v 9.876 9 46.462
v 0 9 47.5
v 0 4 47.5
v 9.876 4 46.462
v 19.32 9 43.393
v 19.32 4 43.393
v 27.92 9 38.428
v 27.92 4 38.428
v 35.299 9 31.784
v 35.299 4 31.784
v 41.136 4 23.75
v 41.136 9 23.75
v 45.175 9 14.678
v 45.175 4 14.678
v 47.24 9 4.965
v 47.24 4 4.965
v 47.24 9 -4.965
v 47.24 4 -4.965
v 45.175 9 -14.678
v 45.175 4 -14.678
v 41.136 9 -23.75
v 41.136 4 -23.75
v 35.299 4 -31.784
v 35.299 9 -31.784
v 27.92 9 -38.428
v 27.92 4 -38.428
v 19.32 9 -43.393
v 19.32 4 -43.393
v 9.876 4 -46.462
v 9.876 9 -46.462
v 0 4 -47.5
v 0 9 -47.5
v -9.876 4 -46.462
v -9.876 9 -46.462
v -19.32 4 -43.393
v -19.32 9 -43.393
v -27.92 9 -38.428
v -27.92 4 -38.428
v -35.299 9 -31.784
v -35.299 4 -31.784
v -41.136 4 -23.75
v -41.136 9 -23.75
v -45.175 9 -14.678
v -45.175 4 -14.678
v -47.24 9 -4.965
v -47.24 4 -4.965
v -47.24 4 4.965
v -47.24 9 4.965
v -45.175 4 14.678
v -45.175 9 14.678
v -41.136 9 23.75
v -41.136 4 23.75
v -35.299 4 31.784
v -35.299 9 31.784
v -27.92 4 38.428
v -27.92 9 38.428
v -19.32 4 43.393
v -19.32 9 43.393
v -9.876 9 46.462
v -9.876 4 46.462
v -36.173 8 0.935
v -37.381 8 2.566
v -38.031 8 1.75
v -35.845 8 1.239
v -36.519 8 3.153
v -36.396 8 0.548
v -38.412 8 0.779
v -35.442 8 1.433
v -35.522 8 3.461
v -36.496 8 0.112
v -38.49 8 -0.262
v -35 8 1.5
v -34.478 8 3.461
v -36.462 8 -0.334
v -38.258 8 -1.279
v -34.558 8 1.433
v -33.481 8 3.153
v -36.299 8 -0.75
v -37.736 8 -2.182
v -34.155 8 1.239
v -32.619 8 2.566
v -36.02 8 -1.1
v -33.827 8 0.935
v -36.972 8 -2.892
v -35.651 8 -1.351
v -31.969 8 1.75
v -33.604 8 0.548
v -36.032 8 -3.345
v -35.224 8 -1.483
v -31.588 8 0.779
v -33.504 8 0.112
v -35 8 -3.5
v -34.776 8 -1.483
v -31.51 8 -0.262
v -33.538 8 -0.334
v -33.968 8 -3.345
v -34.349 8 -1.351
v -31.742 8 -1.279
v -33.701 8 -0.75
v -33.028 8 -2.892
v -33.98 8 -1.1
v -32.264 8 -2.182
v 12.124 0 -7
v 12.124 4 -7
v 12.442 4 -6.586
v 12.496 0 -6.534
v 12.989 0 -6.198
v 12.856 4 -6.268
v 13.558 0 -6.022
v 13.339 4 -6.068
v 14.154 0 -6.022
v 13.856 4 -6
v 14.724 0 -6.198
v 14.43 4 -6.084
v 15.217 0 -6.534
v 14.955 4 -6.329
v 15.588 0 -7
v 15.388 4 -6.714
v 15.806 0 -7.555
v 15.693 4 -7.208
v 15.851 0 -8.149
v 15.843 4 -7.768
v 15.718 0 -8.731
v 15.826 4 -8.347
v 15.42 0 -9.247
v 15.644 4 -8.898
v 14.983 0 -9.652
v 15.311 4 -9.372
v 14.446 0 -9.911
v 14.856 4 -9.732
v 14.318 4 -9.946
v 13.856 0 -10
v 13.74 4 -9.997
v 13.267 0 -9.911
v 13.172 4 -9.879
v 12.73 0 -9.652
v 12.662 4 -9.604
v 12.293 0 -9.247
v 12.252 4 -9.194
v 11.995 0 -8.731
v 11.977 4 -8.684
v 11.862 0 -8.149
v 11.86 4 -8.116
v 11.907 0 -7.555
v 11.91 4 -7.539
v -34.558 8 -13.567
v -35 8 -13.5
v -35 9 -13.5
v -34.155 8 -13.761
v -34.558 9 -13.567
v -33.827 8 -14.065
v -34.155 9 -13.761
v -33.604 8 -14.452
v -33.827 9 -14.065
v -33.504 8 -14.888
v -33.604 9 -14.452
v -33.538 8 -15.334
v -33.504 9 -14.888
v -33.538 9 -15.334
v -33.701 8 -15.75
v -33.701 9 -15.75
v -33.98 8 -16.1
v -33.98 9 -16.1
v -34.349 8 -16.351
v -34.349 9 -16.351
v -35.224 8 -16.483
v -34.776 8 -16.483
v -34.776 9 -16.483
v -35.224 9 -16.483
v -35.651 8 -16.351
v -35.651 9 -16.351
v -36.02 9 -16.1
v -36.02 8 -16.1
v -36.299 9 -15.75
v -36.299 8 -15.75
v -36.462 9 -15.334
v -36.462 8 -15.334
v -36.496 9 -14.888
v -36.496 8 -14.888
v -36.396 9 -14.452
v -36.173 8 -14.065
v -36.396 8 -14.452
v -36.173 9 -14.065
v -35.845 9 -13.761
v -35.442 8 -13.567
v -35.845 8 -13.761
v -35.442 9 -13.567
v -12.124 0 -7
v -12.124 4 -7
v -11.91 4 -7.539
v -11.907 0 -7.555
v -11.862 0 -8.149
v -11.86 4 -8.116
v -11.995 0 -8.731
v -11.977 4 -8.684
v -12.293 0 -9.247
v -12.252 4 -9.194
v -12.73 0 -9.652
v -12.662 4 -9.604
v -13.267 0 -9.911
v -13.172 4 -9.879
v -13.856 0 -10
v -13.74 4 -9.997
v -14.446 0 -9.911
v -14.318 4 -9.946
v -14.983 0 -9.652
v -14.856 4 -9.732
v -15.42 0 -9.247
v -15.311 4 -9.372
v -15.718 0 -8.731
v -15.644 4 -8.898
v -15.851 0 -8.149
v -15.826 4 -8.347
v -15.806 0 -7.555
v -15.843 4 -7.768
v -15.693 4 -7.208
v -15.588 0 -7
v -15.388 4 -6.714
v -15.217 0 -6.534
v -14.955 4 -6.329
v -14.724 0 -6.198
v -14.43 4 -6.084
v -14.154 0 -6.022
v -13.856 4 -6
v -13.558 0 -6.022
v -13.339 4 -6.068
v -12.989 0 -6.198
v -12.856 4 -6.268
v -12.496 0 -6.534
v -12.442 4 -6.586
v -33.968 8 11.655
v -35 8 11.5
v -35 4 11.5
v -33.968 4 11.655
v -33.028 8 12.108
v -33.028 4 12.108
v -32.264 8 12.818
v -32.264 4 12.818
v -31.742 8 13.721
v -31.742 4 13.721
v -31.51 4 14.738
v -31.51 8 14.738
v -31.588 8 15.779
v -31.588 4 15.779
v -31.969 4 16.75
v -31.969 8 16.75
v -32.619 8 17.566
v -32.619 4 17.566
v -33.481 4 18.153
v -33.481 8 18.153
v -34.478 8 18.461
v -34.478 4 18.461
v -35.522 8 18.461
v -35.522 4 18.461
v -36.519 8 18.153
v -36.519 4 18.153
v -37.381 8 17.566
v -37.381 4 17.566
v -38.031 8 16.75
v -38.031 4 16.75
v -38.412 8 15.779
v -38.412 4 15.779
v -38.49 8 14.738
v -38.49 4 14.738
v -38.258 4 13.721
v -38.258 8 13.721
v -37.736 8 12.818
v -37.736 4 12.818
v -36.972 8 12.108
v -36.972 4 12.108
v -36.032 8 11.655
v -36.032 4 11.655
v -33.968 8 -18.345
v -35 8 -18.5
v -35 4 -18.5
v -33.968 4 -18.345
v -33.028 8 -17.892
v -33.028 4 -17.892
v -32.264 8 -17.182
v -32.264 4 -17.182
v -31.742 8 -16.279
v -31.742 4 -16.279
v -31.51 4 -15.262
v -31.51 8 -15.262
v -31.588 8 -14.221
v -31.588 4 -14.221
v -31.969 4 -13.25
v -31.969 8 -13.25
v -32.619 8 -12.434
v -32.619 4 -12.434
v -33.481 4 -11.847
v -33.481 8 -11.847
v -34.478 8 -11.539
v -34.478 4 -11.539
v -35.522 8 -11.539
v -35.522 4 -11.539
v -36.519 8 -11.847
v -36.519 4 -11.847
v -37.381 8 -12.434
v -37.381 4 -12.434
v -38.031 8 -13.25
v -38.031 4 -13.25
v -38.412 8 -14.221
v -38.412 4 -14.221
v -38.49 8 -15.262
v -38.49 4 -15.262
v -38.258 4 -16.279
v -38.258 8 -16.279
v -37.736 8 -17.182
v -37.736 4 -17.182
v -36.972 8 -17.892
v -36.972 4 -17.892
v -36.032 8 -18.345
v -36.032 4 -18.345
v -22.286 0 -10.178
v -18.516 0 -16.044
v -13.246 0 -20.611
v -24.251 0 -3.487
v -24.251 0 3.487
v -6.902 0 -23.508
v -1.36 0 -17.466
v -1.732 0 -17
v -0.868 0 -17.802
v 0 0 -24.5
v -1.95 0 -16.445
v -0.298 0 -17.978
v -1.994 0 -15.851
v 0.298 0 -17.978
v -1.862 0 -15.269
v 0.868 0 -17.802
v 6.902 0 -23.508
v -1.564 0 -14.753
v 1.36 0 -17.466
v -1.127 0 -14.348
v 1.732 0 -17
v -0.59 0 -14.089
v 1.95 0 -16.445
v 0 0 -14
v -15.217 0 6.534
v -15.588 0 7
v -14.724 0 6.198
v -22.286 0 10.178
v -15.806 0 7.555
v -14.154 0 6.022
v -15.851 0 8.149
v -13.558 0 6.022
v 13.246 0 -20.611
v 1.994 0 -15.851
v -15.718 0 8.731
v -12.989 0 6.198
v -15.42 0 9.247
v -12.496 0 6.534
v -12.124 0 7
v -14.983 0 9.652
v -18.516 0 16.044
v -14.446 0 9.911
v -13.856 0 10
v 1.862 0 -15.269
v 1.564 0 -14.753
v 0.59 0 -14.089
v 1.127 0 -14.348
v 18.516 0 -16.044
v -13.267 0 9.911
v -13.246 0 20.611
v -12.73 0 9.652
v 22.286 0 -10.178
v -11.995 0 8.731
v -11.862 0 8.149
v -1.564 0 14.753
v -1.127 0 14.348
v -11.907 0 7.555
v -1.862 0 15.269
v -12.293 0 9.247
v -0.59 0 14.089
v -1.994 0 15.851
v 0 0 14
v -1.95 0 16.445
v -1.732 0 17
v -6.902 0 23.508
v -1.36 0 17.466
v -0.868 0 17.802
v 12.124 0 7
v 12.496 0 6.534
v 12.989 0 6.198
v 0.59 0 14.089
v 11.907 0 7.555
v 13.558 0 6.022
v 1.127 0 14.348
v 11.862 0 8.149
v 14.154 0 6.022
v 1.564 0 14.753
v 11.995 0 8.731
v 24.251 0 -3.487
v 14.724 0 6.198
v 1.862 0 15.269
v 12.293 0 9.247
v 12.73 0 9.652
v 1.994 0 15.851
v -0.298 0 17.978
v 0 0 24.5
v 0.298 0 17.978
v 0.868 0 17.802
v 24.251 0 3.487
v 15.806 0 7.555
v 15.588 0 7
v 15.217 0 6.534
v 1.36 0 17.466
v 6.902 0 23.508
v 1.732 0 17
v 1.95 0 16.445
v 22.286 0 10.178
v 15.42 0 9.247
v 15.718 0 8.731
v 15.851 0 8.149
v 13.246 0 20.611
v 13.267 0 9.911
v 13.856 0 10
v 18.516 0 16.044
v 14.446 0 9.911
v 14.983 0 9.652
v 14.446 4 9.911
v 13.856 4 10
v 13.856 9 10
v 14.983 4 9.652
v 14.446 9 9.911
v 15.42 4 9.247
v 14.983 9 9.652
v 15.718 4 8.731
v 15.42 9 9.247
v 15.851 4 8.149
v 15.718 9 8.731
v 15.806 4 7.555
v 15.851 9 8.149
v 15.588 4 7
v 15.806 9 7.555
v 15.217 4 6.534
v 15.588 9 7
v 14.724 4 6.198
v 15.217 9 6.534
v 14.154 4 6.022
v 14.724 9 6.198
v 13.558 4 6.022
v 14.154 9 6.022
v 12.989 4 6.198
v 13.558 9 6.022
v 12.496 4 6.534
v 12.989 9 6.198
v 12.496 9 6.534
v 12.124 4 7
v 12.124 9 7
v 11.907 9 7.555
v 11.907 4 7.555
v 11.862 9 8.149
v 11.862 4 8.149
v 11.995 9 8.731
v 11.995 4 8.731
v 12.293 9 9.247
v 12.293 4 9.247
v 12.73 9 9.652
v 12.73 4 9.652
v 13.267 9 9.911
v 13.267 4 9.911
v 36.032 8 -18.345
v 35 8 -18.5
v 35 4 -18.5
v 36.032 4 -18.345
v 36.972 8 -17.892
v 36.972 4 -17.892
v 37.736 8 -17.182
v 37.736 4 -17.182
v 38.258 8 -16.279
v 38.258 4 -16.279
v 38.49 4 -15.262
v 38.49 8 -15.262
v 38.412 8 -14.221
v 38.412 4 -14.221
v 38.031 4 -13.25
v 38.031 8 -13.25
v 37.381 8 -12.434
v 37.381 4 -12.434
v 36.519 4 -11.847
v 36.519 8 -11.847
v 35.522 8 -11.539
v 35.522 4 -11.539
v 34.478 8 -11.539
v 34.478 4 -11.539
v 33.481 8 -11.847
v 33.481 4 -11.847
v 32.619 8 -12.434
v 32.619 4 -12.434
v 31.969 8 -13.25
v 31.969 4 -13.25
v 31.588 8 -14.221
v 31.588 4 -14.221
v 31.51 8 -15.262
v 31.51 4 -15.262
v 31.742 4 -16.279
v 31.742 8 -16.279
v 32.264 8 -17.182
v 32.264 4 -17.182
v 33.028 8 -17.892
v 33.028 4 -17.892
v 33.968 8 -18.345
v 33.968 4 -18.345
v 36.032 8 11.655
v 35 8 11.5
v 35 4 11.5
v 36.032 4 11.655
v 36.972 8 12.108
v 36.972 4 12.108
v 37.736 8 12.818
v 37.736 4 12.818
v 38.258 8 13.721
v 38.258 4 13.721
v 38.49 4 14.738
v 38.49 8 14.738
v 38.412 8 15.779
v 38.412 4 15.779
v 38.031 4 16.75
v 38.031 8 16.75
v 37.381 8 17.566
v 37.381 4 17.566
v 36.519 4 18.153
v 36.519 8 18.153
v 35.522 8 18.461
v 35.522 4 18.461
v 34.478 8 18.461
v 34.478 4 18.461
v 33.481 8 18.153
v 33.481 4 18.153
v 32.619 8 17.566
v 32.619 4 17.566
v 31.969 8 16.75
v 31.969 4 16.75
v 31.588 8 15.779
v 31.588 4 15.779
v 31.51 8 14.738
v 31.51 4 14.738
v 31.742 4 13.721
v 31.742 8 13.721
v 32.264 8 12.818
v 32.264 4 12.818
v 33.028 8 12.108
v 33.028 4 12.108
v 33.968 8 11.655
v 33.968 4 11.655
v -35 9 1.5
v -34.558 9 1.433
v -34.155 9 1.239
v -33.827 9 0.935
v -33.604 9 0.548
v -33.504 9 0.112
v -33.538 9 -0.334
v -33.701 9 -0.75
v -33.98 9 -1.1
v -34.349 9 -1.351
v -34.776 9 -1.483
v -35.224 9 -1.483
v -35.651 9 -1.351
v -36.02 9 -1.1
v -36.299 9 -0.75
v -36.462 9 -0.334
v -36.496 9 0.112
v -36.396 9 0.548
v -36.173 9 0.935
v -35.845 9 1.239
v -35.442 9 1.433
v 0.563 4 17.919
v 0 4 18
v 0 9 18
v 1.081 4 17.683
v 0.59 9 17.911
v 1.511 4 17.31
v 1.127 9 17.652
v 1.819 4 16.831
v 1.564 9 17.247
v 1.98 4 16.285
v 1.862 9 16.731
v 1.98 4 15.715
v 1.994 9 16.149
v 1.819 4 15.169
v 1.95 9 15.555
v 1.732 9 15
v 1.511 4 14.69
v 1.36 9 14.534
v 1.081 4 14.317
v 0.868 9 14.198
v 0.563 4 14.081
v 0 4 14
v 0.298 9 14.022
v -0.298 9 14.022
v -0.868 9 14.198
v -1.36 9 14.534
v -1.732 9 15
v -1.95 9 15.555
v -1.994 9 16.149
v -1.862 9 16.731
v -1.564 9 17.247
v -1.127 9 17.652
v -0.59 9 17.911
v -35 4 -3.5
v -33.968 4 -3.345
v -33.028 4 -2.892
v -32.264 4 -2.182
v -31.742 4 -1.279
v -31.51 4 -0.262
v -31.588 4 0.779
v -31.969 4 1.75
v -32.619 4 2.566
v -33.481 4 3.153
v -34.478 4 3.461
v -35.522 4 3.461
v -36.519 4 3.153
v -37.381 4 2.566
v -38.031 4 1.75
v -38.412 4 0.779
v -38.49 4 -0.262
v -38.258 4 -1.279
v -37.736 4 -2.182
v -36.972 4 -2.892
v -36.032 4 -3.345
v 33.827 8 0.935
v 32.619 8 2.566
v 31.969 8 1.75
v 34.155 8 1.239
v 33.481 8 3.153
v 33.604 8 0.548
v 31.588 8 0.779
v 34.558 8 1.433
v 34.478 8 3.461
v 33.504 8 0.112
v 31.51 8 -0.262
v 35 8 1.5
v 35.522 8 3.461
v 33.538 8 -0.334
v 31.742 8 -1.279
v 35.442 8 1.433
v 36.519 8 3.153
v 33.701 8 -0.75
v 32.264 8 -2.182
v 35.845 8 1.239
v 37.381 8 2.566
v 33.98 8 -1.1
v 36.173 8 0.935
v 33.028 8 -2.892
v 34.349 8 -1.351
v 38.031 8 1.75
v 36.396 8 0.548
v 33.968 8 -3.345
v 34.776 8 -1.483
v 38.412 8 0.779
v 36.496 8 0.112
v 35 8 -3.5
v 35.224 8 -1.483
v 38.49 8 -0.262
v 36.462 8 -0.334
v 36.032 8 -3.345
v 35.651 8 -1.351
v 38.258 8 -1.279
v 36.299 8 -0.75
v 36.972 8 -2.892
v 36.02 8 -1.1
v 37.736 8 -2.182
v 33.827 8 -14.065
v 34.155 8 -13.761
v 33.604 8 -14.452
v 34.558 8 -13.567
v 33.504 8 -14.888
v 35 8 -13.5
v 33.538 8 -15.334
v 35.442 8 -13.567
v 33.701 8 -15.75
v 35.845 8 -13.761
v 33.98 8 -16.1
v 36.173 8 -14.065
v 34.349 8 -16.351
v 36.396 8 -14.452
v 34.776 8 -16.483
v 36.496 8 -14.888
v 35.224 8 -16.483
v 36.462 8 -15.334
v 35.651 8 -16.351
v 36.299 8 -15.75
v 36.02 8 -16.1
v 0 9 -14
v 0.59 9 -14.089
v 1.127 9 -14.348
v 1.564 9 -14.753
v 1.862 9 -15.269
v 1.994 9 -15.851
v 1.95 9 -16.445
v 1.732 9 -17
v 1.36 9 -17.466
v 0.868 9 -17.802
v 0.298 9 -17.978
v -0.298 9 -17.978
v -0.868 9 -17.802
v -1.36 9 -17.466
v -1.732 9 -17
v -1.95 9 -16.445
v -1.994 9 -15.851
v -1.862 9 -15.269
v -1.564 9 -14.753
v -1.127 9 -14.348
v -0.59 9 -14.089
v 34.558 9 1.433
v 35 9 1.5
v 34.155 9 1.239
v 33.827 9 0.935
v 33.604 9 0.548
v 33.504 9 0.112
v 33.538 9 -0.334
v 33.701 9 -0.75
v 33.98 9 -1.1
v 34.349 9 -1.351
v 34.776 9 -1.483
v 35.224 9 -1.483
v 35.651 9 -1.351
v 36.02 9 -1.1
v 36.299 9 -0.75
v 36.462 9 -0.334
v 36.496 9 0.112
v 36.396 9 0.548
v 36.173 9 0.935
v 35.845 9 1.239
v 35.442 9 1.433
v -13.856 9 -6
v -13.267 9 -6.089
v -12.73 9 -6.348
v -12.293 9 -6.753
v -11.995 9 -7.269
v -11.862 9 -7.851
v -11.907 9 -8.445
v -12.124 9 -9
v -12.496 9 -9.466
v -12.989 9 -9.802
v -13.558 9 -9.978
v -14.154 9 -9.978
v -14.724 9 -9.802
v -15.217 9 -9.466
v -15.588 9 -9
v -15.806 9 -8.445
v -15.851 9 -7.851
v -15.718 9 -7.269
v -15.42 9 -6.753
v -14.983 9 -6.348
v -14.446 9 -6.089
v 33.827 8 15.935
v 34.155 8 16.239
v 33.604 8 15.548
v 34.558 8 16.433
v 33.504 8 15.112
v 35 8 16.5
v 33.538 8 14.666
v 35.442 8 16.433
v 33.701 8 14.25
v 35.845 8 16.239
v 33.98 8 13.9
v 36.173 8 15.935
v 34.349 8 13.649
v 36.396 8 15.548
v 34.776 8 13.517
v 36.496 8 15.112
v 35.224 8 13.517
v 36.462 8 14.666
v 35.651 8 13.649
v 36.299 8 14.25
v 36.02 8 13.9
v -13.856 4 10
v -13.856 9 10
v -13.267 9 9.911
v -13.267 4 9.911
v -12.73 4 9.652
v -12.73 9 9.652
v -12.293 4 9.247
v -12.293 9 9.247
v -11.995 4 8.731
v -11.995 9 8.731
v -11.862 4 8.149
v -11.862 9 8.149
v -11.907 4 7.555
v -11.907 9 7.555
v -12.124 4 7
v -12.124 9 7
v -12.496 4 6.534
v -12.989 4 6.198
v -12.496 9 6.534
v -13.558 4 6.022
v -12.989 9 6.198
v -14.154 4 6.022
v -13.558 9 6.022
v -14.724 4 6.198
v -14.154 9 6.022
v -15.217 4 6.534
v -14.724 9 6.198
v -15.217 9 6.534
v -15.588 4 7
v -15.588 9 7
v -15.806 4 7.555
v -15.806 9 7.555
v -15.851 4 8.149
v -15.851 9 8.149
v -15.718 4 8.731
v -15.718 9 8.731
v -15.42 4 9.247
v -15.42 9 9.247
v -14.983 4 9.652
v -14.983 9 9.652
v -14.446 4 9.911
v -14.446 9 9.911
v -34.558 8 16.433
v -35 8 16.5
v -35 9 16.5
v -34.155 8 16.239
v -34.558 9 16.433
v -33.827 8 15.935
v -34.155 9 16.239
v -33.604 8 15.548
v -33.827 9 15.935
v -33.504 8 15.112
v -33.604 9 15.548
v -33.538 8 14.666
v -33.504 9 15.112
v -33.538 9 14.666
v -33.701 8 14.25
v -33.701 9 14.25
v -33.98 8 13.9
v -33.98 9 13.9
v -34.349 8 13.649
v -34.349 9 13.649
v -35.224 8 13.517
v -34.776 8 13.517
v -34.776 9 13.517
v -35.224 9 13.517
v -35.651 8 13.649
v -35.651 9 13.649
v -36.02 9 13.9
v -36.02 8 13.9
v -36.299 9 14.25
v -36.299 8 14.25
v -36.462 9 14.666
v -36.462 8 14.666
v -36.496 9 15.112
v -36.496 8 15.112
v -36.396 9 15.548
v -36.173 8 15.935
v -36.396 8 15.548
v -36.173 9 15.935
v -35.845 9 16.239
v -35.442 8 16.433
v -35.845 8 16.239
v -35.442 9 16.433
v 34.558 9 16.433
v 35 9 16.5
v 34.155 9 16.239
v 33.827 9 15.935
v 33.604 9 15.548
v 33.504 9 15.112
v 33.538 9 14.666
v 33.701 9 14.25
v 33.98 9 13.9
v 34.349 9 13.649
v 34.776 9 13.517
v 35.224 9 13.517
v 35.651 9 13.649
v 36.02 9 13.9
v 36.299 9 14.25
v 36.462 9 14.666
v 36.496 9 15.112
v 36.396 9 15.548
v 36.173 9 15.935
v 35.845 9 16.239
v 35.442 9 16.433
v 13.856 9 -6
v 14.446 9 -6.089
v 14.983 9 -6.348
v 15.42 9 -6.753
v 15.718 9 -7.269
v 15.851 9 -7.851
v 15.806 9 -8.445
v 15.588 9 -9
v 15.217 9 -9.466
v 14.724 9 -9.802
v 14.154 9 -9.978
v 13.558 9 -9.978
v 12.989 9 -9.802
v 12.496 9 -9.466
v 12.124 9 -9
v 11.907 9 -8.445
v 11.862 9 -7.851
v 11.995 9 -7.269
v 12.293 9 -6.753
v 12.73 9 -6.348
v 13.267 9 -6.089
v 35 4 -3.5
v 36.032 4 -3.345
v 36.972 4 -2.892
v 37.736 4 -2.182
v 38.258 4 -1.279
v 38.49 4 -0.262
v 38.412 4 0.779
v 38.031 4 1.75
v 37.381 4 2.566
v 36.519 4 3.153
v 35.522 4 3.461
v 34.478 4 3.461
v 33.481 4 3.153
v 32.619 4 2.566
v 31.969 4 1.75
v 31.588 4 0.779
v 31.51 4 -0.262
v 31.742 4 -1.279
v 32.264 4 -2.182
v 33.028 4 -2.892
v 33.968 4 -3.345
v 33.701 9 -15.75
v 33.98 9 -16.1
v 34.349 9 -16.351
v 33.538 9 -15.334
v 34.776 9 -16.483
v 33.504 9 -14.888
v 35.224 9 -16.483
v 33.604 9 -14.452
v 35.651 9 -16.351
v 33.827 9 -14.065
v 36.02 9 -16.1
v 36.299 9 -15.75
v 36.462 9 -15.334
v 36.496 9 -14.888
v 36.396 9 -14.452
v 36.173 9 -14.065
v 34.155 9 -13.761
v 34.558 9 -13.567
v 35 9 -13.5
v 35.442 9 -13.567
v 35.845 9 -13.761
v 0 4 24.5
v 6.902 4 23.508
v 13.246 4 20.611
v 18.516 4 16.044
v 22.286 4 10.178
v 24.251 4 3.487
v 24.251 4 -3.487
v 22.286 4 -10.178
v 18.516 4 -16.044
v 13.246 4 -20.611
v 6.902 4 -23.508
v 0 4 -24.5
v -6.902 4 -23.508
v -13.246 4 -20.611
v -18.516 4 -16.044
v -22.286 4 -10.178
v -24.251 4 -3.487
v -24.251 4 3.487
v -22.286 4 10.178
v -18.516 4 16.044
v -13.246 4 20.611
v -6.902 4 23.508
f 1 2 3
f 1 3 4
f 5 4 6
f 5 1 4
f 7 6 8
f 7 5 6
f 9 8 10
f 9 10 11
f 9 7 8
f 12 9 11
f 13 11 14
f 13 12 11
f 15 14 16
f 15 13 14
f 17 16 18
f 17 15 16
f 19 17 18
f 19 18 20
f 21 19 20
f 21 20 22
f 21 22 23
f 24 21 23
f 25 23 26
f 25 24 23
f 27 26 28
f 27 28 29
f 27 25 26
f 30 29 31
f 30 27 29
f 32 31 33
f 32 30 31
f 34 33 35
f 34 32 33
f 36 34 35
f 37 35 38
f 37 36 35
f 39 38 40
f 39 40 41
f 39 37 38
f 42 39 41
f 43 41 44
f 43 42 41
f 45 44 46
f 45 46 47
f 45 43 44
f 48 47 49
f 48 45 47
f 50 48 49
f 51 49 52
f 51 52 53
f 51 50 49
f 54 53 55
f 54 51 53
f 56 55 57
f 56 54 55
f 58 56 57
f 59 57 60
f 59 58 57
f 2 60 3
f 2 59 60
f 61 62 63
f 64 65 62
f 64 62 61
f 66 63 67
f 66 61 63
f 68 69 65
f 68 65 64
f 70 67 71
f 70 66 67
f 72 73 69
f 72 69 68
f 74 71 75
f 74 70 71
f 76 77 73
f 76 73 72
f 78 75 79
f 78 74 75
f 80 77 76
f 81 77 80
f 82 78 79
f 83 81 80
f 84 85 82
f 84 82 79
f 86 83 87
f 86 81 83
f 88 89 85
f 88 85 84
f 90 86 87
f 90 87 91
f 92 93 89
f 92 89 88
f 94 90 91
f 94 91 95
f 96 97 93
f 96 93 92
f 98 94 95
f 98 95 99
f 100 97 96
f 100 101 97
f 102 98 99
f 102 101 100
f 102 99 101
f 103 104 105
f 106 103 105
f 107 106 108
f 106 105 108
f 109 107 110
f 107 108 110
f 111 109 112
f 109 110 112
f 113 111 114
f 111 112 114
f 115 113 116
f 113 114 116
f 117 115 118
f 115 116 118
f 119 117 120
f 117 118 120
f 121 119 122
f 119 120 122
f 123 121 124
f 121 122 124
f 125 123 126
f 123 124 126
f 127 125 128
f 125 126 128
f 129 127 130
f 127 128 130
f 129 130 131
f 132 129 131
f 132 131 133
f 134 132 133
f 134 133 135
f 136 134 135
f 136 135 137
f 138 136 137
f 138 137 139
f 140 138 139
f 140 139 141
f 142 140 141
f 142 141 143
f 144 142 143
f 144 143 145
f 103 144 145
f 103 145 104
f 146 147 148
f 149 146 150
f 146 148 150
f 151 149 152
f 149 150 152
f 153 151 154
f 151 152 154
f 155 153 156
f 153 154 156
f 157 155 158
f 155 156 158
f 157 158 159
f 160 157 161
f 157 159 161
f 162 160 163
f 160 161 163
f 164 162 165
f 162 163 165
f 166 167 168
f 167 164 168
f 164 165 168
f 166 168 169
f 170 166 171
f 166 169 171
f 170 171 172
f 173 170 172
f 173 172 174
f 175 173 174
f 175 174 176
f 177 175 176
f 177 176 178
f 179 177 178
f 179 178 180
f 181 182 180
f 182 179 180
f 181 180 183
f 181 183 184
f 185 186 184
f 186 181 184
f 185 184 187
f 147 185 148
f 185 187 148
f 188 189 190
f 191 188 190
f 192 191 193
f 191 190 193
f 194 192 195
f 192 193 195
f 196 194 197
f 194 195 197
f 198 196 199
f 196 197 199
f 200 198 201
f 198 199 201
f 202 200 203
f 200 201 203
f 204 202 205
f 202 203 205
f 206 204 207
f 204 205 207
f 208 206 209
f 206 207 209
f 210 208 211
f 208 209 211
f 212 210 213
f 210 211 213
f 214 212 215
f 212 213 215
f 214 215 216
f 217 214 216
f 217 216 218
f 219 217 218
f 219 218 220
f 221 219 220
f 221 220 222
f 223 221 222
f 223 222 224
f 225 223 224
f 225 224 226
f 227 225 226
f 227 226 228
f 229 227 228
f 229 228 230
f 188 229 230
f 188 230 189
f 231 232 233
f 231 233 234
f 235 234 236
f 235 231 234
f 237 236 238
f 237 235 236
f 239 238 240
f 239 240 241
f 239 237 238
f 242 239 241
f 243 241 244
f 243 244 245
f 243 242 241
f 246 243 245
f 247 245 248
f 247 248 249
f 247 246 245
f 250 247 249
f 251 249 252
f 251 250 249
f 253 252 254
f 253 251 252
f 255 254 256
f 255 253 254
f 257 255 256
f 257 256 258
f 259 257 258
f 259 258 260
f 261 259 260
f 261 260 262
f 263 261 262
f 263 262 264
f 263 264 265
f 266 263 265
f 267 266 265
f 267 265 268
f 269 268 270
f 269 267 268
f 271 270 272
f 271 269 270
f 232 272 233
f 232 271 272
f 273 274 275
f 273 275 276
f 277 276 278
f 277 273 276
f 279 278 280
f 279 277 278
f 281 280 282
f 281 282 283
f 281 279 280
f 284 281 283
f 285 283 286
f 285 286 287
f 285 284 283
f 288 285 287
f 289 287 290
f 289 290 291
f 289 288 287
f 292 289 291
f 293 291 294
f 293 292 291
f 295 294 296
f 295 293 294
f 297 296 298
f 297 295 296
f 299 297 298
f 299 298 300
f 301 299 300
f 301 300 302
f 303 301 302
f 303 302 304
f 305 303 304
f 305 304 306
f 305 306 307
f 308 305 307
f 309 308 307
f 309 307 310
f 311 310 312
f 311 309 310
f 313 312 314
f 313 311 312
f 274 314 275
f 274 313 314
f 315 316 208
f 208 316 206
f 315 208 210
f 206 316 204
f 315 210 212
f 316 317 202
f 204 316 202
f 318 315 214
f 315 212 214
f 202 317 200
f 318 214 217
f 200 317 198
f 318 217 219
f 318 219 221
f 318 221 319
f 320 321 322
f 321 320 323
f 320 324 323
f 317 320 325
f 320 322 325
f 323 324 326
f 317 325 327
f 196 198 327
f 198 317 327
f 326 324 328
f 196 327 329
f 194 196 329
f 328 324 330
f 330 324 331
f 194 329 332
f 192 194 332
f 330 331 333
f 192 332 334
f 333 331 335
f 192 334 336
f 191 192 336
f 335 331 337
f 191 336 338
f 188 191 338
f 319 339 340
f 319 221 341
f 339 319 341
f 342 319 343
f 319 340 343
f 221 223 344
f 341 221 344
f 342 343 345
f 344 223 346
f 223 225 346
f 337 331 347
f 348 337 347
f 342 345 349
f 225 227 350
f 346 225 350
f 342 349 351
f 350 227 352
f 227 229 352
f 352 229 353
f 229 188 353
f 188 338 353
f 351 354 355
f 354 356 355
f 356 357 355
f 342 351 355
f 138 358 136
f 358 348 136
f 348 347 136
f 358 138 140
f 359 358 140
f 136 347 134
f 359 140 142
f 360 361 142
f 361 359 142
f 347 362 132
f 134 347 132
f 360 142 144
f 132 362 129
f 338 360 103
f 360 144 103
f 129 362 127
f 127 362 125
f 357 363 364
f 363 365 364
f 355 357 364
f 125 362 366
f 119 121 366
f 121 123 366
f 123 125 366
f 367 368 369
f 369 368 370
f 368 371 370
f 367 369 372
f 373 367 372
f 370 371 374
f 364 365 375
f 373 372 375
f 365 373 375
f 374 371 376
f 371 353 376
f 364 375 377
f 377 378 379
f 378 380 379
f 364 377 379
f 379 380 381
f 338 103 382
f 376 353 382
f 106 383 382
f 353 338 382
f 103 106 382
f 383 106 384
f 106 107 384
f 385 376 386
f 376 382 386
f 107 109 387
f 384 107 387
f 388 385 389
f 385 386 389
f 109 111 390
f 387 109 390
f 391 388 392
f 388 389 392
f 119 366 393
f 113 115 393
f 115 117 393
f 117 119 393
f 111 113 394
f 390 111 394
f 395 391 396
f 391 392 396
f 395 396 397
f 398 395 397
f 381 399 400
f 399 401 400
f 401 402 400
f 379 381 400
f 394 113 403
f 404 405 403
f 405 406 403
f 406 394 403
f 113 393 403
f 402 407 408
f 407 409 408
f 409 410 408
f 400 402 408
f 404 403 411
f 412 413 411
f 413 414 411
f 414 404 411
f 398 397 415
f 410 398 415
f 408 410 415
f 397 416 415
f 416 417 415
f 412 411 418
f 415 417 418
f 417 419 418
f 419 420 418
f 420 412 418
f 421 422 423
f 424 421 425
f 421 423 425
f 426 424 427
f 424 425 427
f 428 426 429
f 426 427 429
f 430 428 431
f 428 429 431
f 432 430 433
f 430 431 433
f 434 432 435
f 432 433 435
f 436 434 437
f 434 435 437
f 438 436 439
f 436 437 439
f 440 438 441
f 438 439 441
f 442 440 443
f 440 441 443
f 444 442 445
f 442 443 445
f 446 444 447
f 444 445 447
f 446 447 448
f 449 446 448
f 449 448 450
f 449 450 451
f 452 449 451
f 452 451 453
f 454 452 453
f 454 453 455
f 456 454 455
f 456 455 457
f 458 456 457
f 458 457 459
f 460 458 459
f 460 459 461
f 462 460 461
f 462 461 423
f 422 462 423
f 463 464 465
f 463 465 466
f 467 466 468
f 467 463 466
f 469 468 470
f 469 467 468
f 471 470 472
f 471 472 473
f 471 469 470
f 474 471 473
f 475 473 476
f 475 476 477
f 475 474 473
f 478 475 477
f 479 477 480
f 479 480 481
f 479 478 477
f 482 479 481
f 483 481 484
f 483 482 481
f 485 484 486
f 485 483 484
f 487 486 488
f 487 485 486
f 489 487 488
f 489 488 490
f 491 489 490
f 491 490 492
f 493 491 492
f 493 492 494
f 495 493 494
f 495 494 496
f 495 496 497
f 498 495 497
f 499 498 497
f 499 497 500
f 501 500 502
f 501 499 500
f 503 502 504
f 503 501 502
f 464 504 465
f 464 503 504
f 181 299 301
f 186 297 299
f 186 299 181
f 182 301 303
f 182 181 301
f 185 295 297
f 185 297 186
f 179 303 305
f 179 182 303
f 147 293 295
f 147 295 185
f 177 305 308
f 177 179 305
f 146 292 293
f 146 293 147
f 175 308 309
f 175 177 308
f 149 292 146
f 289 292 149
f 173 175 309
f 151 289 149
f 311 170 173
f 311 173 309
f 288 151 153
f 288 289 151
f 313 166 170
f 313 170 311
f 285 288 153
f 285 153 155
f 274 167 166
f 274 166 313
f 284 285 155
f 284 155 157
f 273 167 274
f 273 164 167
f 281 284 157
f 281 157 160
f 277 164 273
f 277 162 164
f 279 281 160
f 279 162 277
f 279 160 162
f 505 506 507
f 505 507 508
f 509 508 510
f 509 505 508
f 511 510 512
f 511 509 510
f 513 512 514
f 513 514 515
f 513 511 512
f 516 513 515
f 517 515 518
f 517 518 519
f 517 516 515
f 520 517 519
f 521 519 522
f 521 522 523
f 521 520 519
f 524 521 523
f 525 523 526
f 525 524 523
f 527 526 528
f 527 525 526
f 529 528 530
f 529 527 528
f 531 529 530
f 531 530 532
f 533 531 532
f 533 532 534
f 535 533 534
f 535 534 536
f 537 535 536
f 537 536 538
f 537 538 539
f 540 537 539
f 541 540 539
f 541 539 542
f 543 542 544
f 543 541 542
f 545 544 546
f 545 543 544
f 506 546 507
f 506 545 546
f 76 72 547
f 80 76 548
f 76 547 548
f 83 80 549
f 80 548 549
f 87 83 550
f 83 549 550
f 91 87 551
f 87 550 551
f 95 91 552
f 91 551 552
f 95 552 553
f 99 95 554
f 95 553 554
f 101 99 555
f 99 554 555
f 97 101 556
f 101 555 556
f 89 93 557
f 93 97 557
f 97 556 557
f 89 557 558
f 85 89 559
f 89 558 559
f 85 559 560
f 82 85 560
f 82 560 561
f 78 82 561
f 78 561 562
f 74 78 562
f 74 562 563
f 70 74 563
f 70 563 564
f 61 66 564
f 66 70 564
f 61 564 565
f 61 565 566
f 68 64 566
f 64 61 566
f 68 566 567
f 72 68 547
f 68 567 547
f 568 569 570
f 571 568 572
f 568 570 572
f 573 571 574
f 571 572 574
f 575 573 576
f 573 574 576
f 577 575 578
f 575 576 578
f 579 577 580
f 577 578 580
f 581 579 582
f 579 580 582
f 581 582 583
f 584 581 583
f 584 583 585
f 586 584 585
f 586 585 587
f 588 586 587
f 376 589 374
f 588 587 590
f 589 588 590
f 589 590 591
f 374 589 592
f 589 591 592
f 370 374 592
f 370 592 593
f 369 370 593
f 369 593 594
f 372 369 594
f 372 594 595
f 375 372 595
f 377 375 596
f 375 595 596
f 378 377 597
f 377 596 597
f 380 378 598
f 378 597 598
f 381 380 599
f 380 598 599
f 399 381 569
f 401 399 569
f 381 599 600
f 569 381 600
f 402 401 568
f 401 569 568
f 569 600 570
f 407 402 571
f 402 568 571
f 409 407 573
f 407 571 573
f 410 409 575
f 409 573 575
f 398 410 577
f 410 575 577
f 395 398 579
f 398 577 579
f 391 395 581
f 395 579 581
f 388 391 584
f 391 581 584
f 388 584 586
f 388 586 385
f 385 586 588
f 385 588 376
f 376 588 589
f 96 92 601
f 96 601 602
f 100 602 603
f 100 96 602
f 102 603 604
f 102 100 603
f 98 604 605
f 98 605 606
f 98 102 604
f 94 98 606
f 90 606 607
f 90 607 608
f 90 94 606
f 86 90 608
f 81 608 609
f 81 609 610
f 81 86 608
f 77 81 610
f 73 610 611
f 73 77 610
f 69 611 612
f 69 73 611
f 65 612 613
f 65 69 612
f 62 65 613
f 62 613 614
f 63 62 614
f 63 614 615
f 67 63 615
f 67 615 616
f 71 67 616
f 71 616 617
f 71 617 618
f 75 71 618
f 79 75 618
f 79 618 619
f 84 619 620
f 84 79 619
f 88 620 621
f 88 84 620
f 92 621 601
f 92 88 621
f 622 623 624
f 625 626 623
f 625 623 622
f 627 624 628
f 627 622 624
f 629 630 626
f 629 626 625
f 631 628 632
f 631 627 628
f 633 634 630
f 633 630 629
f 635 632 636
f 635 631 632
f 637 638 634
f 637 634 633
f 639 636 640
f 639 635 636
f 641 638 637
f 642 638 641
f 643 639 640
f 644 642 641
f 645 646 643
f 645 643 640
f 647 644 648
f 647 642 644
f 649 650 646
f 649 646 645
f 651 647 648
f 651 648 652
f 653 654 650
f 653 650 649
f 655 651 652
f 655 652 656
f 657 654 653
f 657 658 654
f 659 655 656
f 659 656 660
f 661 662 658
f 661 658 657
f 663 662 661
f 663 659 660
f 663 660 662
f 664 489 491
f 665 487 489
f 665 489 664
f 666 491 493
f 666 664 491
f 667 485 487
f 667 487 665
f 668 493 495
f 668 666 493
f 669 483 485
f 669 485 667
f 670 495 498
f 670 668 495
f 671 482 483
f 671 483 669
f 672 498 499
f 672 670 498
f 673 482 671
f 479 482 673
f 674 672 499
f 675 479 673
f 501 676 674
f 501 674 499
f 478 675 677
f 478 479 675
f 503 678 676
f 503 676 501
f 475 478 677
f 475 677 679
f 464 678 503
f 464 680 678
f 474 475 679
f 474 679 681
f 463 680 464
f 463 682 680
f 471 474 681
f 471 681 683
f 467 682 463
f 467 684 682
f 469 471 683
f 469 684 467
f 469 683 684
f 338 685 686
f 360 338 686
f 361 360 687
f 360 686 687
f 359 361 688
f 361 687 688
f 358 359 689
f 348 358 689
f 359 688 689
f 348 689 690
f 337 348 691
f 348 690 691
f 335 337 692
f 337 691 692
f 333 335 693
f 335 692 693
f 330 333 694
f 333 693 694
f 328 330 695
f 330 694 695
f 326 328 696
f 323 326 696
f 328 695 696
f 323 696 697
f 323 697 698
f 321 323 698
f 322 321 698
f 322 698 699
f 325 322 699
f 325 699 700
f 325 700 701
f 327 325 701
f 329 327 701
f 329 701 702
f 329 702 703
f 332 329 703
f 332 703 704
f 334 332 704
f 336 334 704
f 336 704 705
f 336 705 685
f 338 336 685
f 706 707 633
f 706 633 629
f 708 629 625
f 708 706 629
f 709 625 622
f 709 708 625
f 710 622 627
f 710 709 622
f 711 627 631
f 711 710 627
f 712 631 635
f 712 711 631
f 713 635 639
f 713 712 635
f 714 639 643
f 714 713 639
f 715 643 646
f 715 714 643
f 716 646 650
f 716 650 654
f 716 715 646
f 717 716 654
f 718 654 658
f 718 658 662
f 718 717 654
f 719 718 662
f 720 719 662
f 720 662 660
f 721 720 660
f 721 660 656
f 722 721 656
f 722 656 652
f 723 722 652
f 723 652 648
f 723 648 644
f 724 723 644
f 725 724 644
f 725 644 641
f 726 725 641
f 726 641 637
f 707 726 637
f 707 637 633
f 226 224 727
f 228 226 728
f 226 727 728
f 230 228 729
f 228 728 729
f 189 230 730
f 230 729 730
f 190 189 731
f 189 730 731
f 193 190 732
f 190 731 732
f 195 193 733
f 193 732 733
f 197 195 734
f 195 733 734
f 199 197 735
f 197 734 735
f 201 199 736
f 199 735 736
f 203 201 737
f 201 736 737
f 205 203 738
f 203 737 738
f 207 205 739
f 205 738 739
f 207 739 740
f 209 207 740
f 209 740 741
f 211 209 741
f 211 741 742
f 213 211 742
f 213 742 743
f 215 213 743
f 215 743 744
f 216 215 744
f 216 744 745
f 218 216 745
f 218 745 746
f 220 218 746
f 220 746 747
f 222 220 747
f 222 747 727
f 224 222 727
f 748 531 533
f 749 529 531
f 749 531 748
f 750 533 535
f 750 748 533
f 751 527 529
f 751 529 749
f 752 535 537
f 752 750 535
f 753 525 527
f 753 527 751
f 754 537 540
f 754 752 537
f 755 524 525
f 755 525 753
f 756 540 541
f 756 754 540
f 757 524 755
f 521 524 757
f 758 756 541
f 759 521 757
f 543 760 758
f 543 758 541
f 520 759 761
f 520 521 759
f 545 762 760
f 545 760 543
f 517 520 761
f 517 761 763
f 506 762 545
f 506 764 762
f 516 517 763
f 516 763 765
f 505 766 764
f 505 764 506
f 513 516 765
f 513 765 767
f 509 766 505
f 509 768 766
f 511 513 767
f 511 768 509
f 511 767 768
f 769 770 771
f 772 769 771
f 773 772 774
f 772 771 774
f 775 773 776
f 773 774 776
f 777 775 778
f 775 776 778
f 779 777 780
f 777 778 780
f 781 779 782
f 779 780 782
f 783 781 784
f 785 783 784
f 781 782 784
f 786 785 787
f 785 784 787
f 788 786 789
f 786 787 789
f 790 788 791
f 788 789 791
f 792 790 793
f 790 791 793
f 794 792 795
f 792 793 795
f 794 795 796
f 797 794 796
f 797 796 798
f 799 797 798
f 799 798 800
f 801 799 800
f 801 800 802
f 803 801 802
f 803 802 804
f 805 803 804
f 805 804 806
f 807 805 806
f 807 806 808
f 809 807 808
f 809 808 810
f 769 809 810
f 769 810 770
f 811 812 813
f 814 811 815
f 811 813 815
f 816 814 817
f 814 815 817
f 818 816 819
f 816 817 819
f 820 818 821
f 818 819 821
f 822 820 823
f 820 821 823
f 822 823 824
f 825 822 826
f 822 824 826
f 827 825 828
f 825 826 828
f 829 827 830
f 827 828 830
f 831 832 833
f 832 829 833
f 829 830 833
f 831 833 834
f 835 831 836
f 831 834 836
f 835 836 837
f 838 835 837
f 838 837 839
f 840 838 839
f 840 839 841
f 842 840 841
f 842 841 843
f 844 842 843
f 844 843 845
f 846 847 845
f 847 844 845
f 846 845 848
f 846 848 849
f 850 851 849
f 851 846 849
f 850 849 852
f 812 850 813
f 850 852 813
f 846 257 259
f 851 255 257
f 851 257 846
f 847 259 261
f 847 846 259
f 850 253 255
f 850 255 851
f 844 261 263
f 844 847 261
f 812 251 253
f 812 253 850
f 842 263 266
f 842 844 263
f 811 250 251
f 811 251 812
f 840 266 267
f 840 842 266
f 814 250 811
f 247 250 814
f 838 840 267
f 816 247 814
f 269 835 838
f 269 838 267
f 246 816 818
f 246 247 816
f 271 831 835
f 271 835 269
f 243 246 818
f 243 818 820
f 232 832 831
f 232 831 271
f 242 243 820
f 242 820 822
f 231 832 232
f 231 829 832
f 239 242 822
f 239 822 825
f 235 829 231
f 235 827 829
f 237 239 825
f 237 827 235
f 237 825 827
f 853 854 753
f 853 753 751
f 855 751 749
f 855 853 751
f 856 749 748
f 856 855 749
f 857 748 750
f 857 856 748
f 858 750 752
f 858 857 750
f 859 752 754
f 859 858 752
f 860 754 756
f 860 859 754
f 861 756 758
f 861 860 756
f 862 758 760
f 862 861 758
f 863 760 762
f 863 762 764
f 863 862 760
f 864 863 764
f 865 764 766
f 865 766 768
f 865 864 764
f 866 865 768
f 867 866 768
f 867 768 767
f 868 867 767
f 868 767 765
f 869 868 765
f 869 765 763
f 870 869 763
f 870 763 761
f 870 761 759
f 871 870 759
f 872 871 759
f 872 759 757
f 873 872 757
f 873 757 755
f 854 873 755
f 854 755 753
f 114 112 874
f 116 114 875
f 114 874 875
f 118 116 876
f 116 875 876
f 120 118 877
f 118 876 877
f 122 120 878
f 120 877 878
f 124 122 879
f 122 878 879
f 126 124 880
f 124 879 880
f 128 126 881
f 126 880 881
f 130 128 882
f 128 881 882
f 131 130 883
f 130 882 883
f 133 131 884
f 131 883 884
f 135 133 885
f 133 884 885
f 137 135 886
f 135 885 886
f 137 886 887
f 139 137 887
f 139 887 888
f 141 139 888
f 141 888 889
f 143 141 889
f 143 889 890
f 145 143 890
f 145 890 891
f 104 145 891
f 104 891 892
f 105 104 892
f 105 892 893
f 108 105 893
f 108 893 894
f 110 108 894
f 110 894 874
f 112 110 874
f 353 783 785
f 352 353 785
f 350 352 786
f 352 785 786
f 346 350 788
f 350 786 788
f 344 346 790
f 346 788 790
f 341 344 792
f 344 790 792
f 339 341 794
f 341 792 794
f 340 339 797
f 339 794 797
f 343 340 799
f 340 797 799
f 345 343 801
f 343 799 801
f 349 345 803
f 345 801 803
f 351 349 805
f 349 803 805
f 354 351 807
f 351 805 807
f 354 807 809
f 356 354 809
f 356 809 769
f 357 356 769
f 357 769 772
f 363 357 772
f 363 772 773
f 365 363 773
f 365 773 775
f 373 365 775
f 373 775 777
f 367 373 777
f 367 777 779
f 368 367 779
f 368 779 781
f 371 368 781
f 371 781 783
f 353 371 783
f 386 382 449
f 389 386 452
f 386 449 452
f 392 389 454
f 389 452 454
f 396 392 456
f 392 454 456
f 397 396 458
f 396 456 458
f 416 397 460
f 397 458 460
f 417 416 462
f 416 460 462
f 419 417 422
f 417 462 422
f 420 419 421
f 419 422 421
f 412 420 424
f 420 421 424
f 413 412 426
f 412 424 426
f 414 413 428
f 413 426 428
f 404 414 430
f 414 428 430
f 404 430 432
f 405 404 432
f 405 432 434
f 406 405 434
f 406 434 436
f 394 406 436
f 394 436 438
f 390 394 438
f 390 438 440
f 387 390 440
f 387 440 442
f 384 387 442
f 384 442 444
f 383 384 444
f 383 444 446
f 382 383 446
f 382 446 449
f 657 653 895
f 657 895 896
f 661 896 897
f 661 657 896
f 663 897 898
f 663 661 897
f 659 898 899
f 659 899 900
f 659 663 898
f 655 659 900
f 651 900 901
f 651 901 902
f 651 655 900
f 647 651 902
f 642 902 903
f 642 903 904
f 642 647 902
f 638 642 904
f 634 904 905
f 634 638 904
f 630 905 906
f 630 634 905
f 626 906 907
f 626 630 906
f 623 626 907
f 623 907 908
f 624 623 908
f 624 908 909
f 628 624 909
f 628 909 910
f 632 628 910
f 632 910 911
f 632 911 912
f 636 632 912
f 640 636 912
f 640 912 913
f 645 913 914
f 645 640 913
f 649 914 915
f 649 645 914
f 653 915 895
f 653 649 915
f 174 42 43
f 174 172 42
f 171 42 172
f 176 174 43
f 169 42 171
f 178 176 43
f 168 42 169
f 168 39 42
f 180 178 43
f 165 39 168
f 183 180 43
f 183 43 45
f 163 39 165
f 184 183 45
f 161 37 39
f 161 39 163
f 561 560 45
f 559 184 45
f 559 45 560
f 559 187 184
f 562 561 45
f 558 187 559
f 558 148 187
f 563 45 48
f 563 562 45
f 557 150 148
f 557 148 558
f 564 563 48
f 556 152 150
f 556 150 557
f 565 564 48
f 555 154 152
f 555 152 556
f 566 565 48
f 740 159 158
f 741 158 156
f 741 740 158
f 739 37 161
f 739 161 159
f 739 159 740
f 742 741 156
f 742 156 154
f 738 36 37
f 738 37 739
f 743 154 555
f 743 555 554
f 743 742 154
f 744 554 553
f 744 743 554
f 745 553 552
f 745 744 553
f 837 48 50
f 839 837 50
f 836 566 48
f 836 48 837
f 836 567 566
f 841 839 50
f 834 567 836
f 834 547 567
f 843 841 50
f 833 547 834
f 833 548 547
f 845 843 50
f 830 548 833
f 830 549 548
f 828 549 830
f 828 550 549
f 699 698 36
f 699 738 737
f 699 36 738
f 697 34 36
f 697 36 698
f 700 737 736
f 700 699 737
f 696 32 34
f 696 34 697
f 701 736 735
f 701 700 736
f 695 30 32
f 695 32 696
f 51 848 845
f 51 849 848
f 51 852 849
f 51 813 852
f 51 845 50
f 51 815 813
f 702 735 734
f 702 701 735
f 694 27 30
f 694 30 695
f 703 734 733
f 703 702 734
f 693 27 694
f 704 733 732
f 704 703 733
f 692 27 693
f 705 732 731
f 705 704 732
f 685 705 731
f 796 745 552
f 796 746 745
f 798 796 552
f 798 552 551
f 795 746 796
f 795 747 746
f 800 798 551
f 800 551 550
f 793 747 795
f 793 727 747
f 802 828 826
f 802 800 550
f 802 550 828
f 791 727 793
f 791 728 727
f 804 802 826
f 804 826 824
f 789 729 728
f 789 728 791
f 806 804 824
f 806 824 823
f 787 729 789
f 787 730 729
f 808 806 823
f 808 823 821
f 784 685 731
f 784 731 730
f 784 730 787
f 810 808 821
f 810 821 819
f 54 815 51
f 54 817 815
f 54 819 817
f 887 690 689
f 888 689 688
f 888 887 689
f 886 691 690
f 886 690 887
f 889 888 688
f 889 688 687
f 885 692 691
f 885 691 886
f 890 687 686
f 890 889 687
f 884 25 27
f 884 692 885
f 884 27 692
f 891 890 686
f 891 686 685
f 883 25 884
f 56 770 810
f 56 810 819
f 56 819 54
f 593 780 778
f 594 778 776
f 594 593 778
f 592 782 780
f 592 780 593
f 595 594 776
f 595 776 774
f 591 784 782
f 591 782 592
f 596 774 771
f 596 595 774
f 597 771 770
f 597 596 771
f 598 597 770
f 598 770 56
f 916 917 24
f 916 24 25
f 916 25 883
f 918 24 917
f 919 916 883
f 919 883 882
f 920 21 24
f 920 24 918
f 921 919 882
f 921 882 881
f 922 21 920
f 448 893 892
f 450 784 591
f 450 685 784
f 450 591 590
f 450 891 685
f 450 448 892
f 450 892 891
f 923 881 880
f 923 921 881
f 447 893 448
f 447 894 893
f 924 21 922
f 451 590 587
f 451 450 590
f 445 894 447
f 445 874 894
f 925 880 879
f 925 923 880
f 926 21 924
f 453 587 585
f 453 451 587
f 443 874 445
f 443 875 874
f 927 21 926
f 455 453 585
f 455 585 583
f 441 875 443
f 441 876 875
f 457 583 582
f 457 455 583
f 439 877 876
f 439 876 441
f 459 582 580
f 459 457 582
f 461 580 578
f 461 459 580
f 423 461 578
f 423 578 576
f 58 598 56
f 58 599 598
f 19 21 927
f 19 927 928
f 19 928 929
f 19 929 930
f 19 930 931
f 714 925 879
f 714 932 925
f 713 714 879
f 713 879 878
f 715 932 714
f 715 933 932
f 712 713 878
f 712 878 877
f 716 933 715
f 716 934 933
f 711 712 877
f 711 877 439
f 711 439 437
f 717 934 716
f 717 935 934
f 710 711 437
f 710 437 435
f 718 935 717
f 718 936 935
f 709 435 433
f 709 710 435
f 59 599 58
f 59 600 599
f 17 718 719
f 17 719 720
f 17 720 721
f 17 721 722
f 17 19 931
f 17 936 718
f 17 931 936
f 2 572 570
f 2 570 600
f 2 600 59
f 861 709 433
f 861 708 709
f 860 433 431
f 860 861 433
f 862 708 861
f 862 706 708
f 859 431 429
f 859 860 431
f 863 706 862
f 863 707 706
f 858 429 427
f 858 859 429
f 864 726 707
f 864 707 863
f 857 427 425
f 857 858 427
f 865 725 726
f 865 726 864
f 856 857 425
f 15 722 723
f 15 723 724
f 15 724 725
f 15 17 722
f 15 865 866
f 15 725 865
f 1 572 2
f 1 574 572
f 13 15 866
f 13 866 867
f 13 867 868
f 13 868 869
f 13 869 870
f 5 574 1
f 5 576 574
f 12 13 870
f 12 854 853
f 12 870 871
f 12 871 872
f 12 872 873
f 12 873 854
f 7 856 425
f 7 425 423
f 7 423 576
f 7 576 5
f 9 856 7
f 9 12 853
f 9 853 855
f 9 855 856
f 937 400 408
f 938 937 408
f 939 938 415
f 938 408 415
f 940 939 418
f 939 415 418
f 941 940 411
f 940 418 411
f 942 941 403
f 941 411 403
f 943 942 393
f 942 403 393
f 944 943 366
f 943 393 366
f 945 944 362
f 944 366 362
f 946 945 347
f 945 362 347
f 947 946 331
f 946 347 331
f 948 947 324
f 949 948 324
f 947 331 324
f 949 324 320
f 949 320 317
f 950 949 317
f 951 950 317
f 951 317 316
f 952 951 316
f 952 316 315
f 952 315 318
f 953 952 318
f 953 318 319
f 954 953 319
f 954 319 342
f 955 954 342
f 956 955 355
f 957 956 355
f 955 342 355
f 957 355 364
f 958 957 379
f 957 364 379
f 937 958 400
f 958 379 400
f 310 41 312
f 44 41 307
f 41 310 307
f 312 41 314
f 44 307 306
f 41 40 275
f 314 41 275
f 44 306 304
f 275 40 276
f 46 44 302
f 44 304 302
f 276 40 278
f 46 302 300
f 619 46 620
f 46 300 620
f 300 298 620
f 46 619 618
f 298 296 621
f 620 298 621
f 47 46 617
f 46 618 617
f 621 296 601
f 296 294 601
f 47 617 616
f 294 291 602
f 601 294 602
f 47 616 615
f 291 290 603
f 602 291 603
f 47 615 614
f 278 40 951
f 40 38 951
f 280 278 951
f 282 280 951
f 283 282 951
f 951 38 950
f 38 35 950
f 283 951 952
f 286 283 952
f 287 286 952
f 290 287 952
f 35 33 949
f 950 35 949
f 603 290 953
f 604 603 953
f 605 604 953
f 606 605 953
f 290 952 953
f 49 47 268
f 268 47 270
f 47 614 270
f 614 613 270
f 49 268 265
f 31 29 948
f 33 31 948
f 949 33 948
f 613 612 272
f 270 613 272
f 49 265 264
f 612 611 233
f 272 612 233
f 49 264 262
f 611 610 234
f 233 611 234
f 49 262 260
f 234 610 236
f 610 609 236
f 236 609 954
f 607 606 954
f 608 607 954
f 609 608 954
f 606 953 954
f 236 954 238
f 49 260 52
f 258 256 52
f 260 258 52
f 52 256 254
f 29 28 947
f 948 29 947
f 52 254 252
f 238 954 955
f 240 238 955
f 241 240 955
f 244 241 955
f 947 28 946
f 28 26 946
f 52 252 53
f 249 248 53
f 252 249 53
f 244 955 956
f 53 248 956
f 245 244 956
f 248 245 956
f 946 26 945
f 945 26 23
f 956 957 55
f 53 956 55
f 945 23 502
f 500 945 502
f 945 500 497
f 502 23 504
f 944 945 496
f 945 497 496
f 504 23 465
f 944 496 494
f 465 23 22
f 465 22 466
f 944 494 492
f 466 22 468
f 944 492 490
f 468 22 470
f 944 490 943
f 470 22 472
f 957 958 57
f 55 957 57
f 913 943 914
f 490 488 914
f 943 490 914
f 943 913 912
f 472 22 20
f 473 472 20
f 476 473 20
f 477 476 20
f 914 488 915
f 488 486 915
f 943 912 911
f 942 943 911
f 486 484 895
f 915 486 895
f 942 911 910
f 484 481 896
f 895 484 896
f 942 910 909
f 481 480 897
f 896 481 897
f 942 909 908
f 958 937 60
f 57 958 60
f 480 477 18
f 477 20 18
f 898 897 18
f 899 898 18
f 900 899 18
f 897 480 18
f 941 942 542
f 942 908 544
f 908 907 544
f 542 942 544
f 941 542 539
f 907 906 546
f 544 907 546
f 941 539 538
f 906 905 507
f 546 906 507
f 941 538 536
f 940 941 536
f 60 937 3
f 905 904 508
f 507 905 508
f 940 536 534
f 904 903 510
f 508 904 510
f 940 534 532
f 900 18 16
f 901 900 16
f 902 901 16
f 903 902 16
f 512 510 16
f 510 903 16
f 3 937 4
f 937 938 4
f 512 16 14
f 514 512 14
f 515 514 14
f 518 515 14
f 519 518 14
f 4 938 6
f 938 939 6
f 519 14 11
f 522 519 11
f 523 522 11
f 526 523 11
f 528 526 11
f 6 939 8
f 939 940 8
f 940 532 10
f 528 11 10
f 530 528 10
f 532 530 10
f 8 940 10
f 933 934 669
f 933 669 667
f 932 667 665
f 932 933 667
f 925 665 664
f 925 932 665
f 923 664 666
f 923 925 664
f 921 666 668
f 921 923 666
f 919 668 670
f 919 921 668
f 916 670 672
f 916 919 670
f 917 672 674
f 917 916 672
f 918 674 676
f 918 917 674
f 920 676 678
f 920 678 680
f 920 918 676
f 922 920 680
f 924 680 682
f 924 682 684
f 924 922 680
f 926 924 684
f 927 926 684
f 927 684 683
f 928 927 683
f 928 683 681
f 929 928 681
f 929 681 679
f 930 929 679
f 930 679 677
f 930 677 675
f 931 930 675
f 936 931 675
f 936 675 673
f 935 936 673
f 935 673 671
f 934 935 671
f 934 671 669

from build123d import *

# Parameters (mm, degrees)
CROQUIS1_R              = 24.5
SALIENTE_EXTRUIR1_DEPTH = 4
CROQUIS2_R              = 2
CORTAR_EXTRUIR1_DEPTH   = 35.878360053
MATRIZC1_COUNT          = 6
SALIENTE_EXTRUIR2_START = 5
CROQUIS3_R              = 47.5
CROQUIS3_R_2            = 2
SALIENTE_EXTRUIR2_DEPTH = 5
CROQUIS6_R              = 1.5
CORTAR_EXTRUIR2_DEPTH   = 68.775364256
CORTAR_EXTRUIR3_START   = -4
CROQUIS7_R              = 3.5
CROQUIS7_R_2            = 1.5
CORTAR_EXTRUIR3_DEPTH   = 4


with BuildPart() as part:
    # Croquis1 → Saliente-Extruir1 (new body)
    with BuildSketch(Plane(origin=(0, 0, 0), x_dir=(1, 0, 0), z_dir=(0, 1, 0))):
        with Locations(Location((0, 0, 0), (0, 0, 270))):
            Circle(CROQUIS1_R)
    extrude(amount=SALIENTE_EXTRUIR1_DEPTH)

    # Croquis2 → Cortar-Extruir1 (cut, through all)
    with BuildSketch(Plane(origin=(0, 4, 0), x_dir=(1, 0, 0), z_dir=(0, 1, 0))):
        with Locations(Location((0, 16, 0), (0, 0, 270))):
            Circle(CROQUIS2_R)
    cortar_extruir1 = extrude(amount=-CORTAR_EXTRUIR1_DEPTH, mode=Mode.SUBTRACT)

    # MatrizC1: Cortar-Extruir1 ×6 about axis
    matrizc1_axis = Axis((0, 0, 0), (0, 1, 0))
    for i in range(1, MATRIZC1_COUNT):
        add(cortar_extruir1.rotate(matrizc1_axis, i * 360 / MATRIZC1_COUNT), mode=Mode.SUBTRACT)

    # Croquis3 → Saliente-Extruir2 (add)
    with BuildSketch(Plane(origin=(0, 4, 0), x_dir=(1, 0, 0), z_dir=(0, 1, 0)).offset(SALIENTE_EXTRUIR2_START)):
        with Locations(Location((0, 0, 0), (0, 0, 270))):
            Circle(CROQUIS3_R)
        with Locations(Location((13.856406461, 8, 0), (0, 0, 270))):
            Circle(CROQUIS3_R_2, mode=Mode.SUBTRACT)
        with Locations(Location((13.856406461, -8, 0), (0, 0, 270))):
            Circle(CROQUIS3_R_2, mode=Mode.SUBTRACT)
        with Locations(Location((0, -16, 0), (0, 0, 270))):
            Circle(CROQUIS3_R_2, mode=Mode.SUBTRACT)
        with Locations(Location((-13.856406461, -8, 0), (0, 0, 270))):
            Circle(CROQUIS3_R_2, mode=Mode.SUBTRACT)
        with Locations(Location((-13.856406461, 8, 0), (0, 0, 270))):
            Circle(CROQUIS3_R_2, mode=Mode.SUBTRACT)
        with Locations(Location((0, 16, 0), (0, 0, 270))):
            Circle(CROQUIS3_R_2, mode=Mode.SUBTRACT)
    extrude(amount=-SALIENTE_EXTRUIR2_DEPTH)

    # Croquis6 → Cortar-Extruir2 (cut, through all)
    with BuildSketch(Plane(origin=(0, 9, 0), x_dir=(1, 0, 0), z_dir=(0, 1, 0))):
        with Locations(Location((-35, 15, 0), (0, 0, 270))):
            Circle(CROQUIS6_R)
        with Locations(Location((-35, 0, 0), (0, 0, 270))):
            Circle(CROQUIS6_R)
        with Locations(Location((-35, -15, 0), (0, 0, 270))):
            Circle(CROQUIS6_R)
    cortar_extruir2 = extrude(amount=-CORTAR_EXTRUIR2_DEPTH, mode=Mode.SUBTRACT)

    # Simetría1: Cortar-Extruir2 across plane
    add(cortar_extruir2.mirror(Plane(origin=(0, 0, 0), x_dir=(0, 0, 1), z_dir=(1, 0, 0))), mode=Mode.SUBTRACT)

    # Croquis7 → Cortar-Extruir3 (cut)
    # profile 1 of 6: a face of its own
    with BuildSketch(Plane.XZ.offset(-4).offset(CORTAR_EXTRUIR3_START)):
        with Locations(Location((35, 15, 0), (0, 0, 270))):
            Circle(CROQUIS7_R)
        with Locations(Location((35, 15, 0), (0, 0, 90))):
            Circle(CROQUIS7_R_2, mode=Mode.SUBTRACT)
    # profile 2 of 6: a face of its own
    with BuildSketch(Plane.XZ.offset(-4).offset(CORTAR_EXTRUIR3_START)):
        with Locations(Location((35, 0, 0), (0, 0, 270))):
            Circle(CROQUIS7_R)
        with Locations(Location((35, 0, 0), (0, 0, 90))):
            Circle(CROQUIS7_R_2, mode=Mode.SUBTRACT)
    # profile 3 of 6: a face of its own
    with BuildSketch(Plane.XZ.offset(-4).offset(CORTAR_EXTRUIR3_START)):
        with Locations(Location((35, -15, 0), (0, 0, 270))):
            Circle(CROQUIS7_R)
        with Locations(Location((35, -15, 0), (0, 0, 90))):
            Circle(CROQUIS7_R_2, mode=Mode.SUBTRACT)
    # profile 4 of 6: a face of its own
    with BuildSketch(Plane.XZ.offset(-4).offset(CORTAR_EXTRUIR3_START)):
        with Locations(Location((-35, 15, 0), (0, 0, 270))):
            Circle(CROQUIS7_R)
        with Locations(Location((-35, 15, 0), (0, 0, 90))):
            Circle(CROQUIS7_R_2, mode=Mode.SUBTRACT)
    # profile 5 of 6: a face of its own
    with BuildSketch(Plane.XZ.offset(-4).offset(CORTAR_EXTRUIR3_START)):
        with Locations(Location((-35, 0, 0), (0, 0, 270))):
            Circle(CROQUIS7_R)
        with Locations(Location((-35, 0, 0), (0, 0, 90))):
            Circle(CROQUIS7_R_2, mode=Mode.SUBTRACT)
    # profile 6 of 6: a face of its own
    with BuildSketch(Plane.XZ.offset(-4).offset(CORTAR_EXTRUIR3_START)):
        with Locations(Location((-35, -15, 0), (0, 0, 270))):
            Circle(CROQUIS7_R)
        with Locations(Location((-35, -15, 0), (0, 0, 90))):
            Circle(CROQUIS7_R_2, mode=Mode.SUBTRACT)
    extrude(amount=CORTAR_EXTRUIR3_DEPTH, mode=Mode.SUBTRACT)


solid = part.part
